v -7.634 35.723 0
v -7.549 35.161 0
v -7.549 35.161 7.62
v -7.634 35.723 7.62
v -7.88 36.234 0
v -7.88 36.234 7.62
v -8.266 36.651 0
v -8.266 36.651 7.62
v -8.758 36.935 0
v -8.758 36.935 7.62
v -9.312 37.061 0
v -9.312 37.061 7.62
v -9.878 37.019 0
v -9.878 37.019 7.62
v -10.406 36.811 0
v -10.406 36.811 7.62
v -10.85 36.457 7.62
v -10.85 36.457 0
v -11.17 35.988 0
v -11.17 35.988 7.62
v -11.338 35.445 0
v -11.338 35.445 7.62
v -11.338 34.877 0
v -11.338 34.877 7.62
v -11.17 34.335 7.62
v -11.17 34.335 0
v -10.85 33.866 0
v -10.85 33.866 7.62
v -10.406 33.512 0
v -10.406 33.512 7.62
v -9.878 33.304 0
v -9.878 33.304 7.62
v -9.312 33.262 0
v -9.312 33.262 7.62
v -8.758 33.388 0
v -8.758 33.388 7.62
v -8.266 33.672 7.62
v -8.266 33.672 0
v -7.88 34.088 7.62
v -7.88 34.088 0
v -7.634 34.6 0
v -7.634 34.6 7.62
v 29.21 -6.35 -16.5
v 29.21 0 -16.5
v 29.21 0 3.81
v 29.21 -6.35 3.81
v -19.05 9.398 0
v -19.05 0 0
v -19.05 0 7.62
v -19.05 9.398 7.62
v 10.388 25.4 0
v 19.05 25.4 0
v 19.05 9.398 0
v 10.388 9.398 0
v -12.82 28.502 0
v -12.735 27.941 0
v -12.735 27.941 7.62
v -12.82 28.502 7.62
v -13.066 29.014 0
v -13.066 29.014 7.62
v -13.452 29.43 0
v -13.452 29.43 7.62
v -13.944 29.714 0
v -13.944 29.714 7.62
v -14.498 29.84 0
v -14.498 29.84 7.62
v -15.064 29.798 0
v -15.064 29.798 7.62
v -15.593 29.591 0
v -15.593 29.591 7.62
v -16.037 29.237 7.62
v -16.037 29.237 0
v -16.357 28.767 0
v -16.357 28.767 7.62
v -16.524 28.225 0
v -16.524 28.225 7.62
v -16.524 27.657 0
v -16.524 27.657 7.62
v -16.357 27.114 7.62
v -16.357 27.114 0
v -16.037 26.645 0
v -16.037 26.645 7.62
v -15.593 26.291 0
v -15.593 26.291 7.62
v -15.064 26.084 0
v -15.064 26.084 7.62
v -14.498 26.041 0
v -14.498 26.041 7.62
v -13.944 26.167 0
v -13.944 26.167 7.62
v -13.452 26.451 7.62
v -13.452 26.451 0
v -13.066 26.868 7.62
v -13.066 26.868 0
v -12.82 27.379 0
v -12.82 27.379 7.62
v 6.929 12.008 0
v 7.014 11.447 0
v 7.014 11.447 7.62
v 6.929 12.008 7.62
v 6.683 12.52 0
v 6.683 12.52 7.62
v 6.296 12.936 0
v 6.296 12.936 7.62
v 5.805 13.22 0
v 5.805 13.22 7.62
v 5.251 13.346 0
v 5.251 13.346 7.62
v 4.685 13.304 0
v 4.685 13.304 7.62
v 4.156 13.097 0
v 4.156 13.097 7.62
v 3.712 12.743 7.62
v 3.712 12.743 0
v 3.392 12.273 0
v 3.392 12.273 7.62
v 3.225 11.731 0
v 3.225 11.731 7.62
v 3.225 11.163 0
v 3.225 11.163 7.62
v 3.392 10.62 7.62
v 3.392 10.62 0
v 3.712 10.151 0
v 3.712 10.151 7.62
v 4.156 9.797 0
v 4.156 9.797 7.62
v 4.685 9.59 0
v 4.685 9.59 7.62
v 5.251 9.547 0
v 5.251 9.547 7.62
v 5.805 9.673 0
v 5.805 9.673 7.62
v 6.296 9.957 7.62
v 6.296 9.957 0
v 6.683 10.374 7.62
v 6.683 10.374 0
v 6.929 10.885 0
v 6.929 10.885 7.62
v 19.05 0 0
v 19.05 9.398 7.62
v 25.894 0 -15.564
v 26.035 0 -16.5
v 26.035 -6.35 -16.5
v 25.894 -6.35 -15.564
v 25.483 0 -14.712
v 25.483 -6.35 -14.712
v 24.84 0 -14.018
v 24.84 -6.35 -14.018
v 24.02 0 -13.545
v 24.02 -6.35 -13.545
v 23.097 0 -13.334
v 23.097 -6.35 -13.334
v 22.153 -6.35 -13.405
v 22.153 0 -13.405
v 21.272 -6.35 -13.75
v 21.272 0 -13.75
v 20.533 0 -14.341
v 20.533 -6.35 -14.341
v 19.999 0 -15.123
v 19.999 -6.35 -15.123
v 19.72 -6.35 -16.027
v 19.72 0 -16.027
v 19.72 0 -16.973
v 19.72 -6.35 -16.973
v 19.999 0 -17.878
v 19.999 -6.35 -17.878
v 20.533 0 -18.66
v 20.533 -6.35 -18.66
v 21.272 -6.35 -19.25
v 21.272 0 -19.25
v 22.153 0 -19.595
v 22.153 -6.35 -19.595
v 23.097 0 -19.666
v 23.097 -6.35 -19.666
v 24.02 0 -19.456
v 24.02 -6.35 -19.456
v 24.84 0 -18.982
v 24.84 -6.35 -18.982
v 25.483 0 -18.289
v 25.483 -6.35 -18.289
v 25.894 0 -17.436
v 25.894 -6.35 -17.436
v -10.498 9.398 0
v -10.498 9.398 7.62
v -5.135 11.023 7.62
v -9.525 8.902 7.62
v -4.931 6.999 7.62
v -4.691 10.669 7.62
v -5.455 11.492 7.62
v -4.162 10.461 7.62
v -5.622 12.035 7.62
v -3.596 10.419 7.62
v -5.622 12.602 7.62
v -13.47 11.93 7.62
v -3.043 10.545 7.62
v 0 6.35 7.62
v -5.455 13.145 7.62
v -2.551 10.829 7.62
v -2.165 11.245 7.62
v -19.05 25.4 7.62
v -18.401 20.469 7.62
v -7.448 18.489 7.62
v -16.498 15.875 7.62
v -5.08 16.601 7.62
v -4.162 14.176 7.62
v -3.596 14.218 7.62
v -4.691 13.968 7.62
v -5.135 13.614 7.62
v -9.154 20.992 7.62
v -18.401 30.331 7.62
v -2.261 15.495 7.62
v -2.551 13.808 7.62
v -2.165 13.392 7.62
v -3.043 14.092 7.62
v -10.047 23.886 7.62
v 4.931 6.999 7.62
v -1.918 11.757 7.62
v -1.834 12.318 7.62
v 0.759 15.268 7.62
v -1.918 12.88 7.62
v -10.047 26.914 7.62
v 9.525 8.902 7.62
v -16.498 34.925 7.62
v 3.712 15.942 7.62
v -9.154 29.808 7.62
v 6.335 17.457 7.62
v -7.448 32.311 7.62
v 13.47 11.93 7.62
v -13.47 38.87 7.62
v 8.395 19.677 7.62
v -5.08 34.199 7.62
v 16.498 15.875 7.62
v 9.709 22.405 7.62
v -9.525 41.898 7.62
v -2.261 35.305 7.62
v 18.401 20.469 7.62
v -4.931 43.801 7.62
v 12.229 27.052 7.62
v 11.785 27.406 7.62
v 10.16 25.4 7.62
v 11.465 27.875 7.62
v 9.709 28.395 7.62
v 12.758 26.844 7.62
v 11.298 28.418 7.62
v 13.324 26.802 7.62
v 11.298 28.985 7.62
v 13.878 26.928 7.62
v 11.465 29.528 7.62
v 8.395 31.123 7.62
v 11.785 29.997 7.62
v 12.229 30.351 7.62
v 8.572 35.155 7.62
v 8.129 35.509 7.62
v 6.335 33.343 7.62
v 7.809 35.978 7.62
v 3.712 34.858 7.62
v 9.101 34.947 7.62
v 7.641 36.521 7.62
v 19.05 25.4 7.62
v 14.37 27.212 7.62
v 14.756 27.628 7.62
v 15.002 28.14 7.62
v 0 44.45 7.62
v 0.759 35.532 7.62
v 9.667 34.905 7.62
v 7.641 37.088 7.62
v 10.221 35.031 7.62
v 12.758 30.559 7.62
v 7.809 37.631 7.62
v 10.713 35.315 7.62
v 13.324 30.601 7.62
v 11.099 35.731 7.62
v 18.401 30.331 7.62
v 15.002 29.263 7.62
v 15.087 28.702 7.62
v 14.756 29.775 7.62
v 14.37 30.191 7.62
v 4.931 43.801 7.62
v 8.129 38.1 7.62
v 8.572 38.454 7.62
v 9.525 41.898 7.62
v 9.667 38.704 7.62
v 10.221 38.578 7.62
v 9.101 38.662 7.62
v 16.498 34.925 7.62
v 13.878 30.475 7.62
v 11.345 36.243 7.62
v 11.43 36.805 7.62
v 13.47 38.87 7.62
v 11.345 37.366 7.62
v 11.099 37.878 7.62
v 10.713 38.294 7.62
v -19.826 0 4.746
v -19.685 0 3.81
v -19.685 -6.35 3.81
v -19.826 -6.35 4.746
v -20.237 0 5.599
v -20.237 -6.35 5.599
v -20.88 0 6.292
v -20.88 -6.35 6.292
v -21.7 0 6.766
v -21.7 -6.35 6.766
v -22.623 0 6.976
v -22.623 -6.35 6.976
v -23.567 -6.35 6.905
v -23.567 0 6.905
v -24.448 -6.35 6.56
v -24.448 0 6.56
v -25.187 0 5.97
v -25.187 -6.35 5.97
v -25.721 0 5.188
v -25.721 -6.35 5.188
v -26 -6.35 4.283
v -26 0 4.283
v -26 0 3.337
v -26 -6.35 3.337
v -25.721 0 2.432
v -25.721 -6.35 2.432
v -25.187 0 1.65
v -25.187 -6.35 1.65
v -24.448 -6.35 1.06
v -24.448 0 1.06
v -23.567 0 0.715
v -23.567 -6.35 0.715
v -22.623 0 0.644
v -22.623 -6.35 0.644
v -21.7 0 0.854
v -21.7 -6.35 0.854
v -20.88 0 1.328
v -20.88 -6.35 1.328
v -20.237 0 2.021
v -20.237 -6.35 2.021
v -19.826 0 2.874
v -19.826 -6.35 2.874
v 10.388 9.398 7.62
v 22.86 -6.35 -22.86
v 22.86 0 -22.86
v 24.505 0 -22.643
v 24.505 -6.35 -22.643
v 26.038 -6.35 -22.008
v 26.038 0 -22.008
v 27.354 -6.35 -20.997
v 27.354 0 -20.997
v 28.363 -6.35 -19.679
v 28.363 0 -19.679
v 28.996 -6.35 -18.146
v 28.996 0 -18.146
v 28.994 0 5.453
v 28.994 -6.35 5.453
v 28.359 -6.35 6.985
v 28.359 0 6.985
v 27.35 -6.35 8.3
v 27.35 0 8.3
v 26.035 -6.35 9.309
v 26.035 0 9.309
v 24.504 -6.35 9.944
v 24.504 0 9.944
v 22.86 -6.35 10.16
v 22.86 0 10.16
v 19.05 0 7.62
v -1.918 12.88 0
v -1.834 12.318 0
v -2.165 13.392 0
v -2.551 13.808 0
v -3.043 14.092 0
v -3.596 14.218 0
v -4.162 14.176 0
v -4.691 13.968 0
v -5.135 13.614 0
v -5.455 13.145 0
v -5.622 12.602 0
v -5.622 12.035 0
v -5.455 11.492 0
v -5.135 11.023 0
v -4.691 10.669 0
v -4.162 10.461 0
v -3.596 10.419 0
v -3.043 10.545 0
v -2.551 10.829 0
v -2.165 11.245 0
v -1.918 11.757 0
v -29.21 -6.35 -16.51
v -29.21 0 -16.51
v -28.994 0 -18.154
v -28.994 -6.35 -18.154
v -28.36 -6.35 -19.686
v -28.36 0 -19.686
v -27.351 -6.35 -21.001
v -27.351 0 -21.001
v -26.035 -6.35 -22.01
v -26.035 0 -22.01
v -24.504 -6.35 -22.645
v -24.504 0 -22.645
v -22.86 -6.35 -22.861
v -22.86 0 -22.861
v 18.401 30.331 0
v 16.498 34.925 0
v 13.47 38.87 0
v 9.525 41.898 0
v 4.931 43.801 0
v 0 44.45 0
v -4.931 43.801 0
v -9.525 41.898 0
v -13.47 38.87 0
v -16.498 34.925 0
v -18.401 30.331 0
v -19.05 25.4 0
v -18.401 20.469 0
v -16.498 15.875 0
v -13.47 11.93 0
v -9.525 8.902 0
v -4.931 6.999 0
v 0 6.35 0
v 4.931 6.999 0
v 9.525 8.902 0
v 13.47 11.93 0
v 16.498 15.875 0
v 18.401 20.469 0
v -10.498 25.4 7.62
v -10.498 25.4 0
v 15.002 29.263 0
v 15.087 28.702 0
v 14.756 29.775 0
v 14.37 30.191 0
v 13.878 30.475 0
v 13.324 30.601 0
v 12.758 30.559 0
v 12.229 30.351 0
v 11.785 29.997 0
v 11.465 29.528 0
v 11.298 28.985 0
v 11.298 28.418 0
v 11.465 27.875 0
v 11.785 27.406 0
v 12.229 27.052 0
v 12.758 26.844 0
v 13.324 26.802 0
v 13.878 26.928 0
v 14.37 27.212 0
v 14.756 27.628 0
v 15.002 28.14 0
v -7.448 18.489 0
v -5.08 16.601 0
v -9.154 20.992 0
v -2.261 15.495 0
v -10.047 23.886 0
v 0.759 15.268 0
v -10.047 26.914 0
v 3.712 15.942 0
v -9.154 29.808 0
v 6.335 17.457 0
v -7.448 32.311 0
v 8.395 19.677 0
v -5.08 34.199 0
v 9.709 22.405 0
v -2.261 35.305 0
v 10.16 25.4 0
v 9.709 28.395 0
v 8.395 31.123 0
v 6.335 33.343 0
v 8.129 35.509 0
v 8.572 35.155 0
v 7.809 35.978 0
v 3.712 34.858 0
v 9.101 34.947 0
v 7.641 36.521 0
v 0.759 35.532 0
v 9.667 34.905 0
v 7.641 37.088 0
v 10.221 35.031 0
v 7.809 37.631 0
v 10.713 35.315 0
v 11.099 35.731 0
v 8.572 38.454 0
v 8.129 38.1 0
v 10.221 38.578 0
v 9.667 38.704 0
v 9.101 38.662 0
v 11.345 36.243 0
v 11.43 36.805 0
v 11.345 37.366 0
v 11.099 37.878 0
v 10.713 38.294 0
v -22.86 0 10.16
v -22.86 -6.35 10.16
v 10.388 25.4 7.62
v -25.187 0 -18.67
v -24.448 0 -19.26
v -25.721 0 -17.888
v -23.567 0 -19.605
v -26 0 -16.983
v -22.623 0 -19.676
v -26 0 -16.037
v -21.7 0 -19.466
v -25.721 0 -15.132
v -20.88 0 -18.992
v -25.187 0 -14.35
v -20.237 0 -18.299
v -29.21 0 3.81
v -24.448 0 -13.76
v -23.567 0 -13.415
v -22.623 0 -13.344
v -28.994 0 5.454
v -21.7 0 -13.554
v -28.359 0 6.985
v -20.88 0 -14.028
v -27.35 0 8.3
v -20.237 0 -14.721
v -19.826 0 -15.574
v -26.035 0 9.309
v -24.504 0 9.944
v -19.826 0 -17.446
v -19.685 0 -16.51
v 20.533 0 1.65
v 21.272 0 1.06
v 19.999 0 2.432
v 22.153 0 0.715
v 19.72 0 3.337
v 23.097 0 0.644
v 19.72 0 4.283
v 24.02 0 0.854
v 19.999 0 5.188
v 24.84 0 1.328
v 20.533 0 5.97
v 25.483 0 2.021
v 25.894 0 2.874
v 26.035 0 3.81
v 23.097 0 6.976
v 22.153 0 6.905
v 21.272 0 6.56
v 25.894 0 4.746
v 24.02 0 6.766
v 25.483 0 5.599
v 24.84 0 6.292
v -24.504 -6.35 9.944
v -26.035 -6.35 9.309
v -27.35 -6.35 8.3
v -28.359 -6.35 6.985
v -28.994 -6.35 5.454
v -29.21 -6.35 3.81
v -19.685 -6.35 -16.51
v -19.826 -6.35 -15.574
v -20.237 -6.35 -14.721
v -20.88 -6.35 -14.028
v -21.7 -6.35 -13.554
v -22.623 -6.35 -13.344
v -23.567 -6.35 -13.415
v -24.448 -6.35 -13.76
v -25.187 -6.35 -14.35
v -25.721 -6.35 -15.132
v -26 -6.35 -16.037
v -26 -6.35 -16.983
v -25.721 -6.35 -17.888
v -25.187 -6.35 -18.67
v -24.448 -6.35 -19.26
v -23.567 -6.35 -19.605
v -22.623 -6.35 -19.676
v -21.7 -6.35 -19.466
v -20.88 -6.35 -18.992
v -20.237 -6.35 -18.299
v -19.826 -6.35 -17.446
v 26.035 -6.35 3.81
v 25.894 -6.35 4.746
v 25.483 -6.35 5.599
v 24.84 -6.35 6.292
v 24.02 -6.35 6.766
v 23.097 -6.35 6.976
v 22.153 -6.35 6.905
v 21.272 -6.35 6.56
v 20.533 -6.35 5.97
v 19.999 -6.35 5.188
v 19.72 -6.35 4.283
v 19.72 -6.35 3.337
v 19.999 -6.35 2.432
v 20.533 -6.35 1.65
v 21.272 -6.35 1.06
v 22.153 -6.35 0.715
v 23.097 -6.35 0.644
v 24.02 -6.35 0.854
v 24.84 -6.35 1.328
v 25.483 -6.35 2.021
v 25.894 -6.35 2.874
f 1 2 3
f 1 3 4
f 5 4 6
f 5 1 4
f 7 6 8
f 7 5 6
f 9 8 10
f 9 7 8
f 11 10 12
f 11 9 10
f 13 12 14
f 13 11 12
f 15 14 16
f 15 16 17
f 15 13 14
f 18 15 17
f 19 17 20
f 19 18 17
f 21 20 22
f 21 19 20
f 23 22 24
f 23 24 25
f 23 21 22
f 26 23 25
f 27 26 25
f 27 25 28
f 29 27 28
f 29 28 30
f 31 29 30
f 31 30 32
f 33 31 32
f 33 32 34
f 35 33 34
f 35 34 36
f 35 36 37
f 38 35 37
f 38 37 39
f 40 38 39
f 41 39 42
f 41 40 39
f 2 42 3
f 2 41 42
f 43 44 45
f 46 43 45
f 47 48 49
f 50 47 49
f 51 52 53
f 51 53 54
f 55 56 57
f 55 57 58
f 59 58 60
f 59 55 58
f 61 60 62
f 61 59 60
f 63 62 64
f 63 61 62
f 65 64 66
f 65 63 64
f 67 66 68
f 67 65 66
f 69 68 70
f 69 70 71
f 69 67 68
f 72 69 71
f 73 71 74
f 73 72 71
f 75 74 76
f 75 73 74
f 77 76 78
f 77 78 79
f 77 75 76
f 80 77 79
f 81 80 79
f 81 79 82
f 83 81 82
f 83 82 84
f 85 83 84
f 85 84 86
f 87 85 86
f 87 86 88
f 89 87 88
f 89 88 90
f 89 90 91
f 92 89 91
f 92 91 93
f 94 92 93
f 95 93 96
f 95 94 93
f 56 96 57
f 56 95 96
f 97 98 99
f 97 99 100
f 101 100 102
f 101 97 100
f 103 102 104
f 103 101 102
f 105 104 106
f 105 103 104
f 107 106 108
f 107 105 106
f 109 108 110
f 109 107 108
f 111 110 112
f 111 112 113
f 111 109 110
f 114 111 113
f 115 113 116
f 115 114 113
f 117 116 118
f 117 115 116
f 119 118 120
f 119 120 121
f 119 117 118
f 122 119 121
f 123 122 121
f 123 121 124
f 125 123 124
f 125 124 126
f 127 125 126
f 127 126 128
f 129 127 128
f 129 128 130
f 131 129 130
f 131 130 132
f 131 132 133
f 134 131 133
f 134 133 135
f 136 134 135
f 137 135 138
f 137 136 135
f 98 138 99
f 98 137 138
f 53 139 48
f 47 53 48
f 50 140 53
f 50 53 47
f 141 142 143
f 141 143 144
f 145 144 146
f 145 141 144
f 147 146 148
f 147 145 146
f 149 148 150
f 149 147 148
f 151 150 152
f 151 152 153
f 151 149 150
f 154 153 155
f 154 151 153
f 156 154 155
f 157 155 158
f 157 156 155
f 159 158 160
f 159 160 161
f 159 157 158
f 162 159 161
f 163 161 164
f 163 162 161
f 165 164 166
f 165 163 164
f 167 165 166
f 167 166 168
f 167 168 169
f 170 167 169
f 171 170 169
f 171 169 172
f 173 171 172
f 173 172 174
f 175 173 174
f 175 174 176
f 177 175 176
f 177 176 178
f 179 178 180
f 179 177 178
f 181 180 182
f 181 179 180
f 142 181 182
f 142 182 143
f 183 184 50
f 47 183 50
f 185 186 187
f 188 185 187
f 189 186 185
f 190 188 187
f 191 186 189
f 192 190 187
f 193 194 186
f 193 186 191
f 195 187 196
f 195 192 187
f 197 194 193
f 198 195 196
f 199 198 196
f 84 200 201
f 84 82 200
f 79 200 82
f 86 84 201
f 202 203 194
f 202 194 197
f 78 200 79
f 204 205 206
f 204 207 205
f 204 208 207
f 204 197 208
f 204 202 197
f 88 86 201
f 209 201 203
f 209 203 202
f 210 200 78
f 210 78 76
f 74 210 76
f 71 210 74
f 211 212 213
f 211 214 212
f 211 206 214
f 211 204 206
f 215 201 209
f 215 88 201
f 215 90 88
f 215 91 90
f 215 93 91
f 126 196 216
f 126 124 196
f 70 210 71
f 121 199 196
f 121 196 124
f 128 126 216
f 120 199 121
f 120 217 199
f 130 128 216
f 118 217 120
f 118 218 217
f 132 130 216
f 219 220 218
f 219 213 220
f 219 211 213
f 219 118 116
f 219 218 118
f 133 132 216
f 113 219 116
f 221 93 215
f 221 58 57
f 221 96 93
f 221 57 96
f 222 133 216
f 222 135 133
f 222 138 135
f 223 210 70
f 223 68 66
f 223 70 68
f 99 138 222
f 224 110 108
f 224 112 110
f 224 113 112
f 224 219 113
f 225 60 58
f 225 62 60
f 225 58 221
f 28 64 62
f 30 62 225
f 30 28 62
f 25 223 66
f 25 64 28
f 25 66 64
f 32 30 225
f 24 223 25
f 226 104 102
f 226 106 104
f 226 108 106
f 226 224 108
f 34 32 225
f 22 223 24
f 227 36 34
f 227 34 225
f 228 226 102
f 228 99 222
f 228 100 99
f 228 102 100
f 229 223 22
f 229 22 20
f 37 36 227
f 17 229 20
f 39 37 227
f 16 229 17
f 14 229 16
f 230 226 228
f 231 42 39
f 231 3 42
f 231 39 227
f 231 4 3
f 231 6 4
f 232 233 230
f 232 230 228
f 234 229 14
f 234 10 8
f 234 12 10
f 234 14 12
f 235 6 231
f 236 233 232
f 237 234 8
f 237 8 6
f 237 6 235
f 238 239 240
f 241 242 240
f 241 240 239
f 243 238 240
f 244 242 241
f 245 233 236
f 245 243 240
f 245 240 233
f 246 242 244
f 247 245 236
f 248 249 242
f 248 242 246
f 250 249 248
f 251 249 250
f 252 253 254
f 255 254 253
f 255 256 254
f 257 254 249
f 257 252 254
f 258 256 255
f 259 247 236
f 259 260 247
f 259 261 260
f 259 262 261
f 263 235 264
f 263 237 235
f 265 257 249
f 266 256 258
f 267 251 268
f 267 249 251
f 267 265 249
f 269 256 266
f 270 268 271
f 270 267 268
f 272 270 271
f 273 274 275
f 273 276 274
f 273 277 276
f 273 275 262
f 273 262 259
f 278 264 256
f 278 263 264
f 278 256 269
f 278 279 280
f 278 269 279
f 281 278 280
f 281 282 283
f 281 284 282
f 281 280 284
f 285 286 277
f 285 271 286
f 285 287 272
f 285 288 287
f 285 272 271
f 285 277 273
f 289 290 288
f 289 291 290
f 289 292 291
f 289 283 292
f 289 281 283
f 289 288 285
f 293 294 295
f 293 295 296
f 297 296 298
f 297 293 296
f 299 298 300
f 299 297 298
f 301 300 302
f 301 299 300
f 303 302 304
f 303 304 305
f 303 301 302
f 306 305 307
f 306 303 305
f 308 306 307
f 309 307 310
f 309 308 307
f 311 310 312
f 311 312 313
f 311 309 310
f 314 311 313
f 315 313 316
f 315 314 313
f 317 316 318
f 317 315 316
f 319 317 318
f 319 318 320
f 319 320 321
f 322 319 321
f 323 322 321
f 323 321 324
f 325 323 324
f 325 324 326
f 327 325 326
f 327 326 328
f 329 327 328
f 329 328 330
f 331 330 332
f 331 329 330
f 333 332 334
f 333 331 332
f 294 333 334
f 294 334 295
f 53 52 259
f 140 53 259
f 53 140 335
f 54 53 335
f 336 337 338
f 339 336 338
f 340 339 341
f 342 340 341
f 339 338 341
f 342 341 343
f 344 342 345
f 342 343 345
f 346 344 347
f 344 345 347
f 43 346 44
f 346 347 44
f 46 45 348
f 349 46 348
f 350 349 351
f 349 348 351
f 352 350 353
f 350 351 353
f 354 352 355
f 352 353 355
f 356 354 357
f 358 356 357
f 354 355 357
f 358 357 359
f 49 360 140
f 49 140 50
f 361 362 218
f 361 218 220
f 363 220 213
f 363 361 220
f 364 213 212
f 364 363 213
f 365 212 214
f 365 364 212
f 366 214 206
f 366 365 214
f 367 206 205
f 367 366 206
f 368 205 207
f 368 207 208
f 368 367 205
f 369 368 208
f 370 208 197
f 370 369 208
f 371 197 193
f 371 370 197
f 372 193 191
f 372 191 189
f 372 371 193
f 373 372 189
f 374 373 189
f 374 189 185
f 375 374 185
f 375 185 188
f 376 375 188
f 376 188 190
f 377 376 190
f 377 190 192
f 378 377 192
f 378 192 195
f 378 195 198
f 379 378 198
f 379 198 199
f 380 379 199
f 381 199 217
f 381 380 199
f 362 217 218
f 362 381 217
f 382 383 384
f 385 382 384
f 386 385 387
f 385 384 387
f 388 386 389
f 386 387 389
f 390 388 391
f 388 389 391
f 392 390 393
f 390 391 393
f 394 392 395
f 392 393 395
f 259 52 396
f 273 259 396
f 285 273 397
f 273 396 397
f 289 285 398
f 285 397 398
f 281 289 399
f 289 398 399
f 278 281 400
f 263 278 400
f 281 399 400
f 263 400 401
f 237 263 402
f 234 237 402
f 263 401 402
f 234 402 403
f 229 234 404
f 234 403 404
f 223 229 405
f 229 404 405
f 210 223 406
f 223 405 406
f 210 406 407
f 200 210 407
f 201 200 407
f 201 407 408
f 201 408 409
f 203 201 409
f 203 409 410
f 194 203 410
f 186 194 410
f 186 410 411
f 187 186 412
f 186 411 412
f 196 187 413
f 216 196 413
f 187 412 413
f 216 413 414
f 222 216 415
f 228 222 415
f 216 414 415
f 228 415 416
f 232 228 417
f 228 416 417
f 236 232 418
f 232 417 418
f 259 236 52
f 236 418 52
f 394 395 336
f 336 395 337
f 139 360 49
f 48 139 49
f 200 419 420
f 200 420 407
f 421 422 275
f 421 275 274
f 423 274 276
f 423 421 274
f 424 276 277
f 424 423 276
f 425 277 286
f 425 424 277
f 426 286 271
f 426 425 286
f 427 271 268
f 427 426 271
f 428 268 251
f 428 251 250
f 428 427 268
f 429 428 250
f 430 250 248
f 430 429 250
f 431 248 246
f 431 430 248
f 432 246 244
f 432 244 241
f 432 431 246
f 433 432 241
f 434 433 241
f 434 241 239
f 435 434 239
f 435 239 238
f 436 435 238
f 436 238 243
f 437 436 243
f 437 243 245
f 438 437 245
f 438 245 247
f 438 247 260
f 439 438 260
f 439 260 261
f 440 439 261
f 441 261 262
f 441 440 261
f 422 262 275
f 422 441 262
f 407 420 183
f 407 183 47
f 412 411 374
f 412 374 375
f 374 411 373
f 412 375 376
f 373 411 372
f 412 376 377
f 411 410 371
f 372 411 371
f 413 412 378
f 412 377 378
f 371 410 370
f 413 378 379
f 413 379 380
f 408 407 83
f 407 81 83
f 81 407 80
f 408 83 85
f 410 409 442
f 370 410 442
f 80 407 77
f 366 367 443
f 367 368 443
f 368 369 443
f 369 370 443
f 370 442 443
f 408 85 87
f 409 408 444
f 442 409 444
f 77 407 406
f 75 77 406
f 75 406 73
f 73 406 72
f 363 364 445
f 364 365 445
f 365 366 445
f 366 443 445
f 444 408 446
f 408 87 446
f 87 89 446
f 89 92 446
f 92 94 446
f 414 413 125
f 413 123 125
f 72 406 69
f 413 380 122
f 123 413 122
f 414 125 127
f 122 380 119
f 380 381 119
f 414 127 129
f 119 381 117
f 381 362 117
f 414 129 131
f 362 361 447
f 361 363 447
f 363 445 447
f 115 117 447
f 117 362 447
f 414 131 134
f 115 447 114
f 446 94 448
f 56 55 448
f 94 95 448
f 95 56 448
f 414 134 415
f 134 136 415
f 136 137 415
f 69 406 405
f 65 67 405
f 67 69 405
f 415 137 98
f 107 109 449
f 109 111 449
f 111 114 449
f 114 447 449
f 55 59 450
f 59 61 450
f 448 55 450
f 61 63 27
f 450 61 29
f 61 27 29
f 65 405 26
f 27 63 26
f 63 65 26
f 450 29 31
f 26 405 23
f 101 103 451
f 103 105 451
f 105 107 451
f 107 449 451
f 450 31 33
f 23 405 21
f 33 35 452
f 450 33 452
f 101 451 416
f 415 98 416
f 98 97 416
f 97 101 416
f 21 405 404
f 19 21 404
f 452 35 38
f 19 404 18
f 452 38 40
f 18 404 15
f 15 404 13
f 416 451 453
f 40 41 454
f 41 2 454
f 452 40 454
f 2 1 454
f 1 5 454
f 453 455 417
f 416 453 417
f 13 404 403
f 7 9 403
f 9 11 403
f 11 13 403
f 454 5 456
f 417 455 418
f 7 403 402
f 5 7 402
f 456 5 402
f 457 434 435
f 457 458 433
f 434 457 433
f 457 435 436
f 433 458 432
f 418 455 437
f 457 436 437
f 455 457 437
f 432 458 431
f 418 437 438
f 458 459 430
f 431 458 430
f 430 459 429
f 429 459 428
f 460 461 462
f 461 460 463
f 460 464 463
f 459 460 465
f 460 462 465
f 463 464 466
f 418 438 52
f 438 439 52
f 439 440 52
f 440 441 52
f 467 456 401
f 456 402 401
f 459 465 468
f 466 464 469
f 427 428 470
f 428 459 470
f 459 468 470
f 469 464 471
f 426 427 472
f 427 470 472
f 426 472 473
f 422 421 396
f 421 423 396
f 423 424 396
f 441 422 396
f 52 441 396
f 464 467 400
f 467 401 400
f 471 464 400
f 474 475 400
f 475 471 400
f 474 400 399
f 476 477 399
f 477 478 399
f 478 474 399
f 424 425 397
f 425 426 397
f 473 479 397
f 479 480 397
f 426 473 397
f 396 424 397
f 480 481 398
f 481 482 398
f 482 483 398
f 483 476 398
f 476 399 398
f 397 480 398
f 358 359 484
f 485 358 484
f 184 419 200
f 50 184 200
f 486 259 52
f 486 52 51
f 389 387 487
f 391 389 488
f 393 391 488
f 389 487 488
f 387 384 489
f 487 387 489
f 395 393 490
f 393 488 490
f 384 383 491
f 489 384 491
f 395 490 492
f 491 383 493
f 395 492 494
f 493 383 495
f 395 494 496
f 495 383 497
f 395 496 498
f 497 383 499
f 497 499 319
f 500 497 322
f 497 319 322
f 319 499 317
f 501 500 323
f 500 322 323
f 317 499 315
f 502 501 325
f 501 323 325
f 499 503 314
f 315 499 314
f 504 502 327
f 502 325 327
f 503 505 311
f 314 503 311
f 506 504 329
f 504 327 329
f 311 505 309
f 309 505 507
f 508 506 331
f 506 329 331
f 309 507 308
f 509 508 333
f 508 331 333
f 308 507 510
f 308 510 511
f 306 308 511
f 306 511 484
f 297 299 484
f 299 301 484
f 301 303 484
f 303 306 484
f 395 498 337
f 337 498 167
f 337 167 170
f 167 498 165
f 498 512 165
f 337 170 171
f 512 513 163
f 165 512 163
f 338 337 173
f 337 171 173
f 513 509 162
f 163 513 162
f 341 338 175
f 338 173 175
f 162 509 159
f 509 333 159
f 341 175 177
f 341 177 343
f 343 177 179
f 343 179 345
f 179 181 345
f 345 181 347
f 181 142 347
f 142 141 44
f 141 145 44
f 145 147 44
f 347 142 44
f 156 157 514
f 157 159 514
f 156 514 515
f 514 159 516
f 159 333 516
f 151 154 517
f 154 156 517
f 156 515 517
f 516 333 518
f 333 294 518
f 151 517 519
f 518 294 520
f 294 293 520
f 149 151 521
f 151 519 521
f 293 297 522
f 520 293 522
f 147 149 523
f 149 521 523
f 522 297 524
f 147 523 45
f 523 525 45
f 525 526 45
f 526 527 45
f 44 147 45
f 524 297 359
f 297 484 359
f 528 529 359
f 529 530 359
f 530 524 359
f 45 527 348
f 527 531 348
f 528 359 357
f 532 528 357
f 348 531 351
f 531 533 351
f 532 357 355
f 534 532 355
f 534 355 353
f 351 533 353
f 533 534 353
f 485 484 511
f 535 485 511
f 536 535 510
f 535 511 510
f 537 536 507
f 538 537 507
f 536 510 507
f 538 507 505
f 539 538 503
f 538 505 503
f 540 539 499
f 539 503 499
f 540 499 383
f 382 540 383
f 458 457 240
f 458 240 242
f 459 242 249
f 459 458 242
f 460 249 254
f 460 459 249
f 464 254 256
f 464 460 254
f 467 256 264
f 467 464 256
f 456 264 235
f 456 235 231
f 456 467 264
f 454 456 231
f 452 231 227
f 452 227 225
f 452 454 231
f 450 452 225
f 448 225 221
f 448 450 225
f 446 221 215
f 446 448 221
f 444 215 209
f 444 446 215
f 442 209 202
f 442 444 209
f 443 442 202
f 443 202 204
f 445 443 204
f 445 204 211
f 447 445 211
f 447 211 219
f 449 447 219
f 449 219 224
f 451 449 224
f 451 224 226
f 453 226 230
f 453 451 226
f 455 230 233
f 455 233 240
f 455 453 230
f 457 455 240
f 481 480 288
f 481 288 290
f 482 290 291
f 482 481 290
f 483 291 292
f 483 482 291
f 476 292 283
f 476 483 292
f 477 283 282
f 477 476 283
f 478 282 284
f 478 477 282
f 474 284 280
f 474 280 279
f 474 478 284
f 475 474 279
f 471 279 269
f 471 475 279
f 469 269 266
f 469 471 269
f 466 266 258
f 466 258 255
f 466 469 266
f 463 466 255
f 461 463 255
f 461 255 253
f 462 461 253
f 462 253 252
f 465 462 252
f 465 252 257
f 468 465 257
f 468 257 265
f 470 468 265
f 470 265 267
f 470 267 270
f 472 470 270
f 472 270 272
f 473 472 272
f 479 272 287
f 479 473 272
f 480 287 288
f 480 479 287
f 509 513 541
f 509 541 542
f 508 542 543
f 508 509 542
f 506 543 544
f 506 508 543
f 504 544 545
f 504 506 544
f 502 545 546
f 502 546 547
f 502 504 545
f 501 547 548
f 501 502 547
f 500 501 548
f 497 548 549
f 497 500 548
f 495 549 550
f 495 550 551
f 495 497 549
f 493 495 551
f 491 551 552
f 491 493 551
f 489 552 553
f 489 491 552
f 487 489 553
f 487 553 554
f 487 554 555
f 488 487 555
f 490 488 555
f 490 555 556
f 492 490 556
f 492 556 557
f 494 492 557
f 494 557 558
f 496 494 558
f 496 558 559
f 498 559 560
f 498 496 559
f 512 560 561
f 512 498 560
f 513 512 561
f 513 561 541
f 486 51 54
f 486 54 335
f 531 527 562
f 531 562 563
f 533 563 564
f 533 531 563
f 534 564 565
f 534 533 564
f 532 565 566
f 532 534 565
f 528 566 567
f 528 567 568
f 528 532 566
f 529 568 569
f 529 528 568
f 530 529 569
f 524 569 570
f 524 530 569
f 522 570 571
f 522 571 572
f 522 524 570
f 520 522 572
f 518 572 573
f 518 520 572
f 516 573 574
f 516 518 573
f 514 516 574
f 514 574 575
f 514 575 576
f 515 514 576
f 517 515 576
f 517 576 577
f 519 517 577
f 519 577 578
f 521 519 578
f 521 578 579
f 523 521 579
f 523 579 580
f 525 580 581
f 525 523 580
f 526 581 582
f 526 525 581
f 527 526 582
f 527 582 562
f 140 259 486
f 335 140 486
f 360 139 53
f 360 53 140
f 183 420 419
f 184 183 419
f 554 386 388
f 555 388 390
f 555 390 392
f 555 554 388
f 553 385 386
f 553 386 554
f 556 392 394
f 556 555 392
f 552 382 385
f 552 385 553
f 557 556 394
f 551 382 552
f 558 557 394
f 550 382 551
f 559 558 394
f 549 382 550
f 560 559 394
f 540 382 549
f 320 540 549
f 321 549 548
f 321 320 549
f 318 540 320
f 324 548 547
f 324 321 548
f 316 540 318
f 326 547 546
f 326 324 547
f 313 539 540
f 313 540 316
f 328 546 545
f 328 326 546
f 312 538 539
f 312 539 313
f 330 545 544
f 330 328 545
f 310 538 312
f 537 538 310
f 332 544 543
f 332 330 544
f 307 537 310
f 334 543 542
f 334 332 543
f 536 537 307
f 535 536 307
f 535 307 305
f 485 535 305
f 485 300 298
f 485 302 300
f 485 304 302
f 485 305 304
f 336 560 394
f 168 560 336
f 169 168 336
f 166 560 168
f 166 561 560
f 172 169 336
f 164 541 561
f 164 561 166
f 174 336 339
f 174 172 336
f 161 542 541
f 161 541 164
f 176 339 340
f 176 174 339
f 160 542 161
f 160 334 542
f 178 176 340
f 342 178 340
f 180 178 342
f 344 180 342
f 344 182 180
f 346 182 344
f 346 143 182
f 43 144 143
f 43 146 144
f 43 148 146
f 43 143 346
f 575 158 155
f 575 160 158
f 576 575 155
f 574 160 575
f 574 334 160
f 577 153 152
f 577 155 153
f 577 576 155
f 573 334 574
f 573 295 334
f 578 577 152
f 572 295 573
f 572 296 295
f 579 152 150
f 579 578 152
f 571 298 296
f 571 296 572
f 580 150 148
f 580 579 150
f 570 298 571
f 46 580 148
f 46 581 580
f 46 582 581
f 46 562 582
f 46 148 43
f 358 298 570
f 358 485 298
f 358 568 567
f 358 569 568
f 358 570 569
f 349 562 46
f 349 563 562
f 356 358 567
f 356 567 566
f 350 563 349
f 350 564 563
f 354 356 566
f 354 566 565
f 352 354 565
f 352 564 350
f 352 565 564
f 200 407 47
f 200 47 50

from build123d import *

# Parameters (mm, degrees)
F0_R     = 19.05
F0_R_2   = 1.905
F0_R_3   = 10.16
F1_DEPTH = 7.62
F2_R     = 3.175
F3_DEPTH = 6.35
F4_W     = 38.1
F4_H     = 7.62
F5_DEPTH = 9.398
F6_W     = 8.5519130781
F6_H     = 7.62
F7_DEPTH = 16.002
F6_W_2   = 8.6616750315


# Not quite as in the source:
# - a feature names something its author has since deleted; it is built from what else it names


with BuildPart() as f1:
    # F0 (on Top) → F1 (new body)
    with BuildSketch(Plane.XY):
        with Locations((0, 25.4)):
            Circle(F0_R)
        with Locations((-3.7385604232, 12.3184441793)):
            Circle(F0_R_2, mode=Mode.SUBTRACT)
        with Locations((5.1086041234, 11.4467908741)):
            Circle(F0_R_2, mode=Mode.SUBTRACT)
        with Locations((-14.6401597077, 27.9407882108)):
            Circle(F0_R_2, mode=Mode.SUBTRACT)
        with Locations((-9.4539924163, 35.1612984993)):
            Circle(F0_R_2, mode=Mode.SUBTRACT)
        with Locations((0, 25.4)):
            Circle(F0_R_3, mode=Mode.SUBTRACT)
        with Locations((13.1818417669, 28.7015100533)):
            Circle(F0_R_2, mode=Mode.SUBTRACT)
        with Locations((9.525, 36.8045717149)):
            Circle(F0_R_2, mode=Mode.SUBTRACT)
    extrude(amount=F1_DEPTH)


with BuildPart() as f3:
    # F2 (on Front) → F3 (new body)
    with BuildSketch(Plane.XZ):
        with BuildLine():
            Line((29.2099922622, -16.5000868889), (29.21, 3.8099987387))
            ThreePointArc((29.21, 3.8099987387), (27.3501285065, 8.3001276146), (22.86, 10.16))
            Line((22.86, 10.16), (-22.86, 10.16))
            ThreePointArc((-22.86, 10.16), (-27.3501280662, 8.3001280549), (-29.21, 3.8099999839))
            Line((-29.21, 3.8099999839), (-29.2099999486, -16.51))
            ThreePointArc((-29.2099999486, -16.51), (-27.3505815493, -21.0009571859), (-22.86, -22.8612825818))
            Line((-22.86, -22.8612825818), (22.86, -22.86))
            ThreePointArc((22.86, -22.86), (27.3536315078, -20.9966218776), (29.2099922622, -16.5000868889))
        make_face()
        with Locations((-22.86, -16.51)):
            Circle(F2_R, mode=Mode.SUBTRACT)
        with Locations((22.86, -16.5000868889)):
            Circle(F2_R, mode=Mode.SUBTRACT)
        with Locations((-22.86, 3.81)):
            Circle(F2_R, mode=Mode.SUBTRACT)
        with Locations((22.86, 3.8099987387)):
            Circle(F2_R, mode=Mode.SUBTRACT)
    extrude(amount=F3_DEPTH)


with BuildPart() as f5:
    # F4 (on face) → F5 (new body)
    with BuildSketch(Plane(origin=(0, 0, 0), x_dir=(-1, 0, 0), z_dir=(0, 1, 0))):
        with Locations((0, 3.81)):
            Rectangle(F4_W, F4_H)
    extrude(amount=F5_DEPTH)


with BuildPart() as f7:
    # F6 (on face) → F7 (new body)
    with BuildSketch(Plane(origin=(0, 9.398, 0), x_dir=(-1, 0, 0), z_dir=(0, 1, 0))):
        with Locations((14.7740434609, 3.81)):
            Rectangle(F6_W, F6_H)
    extrude(amount=F7_DEPTH)


with BuildPart() as f7b:
    # F6 (on face) → F7, piece 2 (new body)
    with BuildSketch(Plane(origin=(0, 9.398, 0), x_dir=(-1, 0, 0), z_dir=(0, 1, 0))):
        with Locations((-14.7191624843, 3.81)):
            Rectangle(F6_W_2, F6_H)
    extrude(amount=F7_DEPTH)


solid = Compound([f1.part, f3.part, f5.part, f7.part, f7b.part])
